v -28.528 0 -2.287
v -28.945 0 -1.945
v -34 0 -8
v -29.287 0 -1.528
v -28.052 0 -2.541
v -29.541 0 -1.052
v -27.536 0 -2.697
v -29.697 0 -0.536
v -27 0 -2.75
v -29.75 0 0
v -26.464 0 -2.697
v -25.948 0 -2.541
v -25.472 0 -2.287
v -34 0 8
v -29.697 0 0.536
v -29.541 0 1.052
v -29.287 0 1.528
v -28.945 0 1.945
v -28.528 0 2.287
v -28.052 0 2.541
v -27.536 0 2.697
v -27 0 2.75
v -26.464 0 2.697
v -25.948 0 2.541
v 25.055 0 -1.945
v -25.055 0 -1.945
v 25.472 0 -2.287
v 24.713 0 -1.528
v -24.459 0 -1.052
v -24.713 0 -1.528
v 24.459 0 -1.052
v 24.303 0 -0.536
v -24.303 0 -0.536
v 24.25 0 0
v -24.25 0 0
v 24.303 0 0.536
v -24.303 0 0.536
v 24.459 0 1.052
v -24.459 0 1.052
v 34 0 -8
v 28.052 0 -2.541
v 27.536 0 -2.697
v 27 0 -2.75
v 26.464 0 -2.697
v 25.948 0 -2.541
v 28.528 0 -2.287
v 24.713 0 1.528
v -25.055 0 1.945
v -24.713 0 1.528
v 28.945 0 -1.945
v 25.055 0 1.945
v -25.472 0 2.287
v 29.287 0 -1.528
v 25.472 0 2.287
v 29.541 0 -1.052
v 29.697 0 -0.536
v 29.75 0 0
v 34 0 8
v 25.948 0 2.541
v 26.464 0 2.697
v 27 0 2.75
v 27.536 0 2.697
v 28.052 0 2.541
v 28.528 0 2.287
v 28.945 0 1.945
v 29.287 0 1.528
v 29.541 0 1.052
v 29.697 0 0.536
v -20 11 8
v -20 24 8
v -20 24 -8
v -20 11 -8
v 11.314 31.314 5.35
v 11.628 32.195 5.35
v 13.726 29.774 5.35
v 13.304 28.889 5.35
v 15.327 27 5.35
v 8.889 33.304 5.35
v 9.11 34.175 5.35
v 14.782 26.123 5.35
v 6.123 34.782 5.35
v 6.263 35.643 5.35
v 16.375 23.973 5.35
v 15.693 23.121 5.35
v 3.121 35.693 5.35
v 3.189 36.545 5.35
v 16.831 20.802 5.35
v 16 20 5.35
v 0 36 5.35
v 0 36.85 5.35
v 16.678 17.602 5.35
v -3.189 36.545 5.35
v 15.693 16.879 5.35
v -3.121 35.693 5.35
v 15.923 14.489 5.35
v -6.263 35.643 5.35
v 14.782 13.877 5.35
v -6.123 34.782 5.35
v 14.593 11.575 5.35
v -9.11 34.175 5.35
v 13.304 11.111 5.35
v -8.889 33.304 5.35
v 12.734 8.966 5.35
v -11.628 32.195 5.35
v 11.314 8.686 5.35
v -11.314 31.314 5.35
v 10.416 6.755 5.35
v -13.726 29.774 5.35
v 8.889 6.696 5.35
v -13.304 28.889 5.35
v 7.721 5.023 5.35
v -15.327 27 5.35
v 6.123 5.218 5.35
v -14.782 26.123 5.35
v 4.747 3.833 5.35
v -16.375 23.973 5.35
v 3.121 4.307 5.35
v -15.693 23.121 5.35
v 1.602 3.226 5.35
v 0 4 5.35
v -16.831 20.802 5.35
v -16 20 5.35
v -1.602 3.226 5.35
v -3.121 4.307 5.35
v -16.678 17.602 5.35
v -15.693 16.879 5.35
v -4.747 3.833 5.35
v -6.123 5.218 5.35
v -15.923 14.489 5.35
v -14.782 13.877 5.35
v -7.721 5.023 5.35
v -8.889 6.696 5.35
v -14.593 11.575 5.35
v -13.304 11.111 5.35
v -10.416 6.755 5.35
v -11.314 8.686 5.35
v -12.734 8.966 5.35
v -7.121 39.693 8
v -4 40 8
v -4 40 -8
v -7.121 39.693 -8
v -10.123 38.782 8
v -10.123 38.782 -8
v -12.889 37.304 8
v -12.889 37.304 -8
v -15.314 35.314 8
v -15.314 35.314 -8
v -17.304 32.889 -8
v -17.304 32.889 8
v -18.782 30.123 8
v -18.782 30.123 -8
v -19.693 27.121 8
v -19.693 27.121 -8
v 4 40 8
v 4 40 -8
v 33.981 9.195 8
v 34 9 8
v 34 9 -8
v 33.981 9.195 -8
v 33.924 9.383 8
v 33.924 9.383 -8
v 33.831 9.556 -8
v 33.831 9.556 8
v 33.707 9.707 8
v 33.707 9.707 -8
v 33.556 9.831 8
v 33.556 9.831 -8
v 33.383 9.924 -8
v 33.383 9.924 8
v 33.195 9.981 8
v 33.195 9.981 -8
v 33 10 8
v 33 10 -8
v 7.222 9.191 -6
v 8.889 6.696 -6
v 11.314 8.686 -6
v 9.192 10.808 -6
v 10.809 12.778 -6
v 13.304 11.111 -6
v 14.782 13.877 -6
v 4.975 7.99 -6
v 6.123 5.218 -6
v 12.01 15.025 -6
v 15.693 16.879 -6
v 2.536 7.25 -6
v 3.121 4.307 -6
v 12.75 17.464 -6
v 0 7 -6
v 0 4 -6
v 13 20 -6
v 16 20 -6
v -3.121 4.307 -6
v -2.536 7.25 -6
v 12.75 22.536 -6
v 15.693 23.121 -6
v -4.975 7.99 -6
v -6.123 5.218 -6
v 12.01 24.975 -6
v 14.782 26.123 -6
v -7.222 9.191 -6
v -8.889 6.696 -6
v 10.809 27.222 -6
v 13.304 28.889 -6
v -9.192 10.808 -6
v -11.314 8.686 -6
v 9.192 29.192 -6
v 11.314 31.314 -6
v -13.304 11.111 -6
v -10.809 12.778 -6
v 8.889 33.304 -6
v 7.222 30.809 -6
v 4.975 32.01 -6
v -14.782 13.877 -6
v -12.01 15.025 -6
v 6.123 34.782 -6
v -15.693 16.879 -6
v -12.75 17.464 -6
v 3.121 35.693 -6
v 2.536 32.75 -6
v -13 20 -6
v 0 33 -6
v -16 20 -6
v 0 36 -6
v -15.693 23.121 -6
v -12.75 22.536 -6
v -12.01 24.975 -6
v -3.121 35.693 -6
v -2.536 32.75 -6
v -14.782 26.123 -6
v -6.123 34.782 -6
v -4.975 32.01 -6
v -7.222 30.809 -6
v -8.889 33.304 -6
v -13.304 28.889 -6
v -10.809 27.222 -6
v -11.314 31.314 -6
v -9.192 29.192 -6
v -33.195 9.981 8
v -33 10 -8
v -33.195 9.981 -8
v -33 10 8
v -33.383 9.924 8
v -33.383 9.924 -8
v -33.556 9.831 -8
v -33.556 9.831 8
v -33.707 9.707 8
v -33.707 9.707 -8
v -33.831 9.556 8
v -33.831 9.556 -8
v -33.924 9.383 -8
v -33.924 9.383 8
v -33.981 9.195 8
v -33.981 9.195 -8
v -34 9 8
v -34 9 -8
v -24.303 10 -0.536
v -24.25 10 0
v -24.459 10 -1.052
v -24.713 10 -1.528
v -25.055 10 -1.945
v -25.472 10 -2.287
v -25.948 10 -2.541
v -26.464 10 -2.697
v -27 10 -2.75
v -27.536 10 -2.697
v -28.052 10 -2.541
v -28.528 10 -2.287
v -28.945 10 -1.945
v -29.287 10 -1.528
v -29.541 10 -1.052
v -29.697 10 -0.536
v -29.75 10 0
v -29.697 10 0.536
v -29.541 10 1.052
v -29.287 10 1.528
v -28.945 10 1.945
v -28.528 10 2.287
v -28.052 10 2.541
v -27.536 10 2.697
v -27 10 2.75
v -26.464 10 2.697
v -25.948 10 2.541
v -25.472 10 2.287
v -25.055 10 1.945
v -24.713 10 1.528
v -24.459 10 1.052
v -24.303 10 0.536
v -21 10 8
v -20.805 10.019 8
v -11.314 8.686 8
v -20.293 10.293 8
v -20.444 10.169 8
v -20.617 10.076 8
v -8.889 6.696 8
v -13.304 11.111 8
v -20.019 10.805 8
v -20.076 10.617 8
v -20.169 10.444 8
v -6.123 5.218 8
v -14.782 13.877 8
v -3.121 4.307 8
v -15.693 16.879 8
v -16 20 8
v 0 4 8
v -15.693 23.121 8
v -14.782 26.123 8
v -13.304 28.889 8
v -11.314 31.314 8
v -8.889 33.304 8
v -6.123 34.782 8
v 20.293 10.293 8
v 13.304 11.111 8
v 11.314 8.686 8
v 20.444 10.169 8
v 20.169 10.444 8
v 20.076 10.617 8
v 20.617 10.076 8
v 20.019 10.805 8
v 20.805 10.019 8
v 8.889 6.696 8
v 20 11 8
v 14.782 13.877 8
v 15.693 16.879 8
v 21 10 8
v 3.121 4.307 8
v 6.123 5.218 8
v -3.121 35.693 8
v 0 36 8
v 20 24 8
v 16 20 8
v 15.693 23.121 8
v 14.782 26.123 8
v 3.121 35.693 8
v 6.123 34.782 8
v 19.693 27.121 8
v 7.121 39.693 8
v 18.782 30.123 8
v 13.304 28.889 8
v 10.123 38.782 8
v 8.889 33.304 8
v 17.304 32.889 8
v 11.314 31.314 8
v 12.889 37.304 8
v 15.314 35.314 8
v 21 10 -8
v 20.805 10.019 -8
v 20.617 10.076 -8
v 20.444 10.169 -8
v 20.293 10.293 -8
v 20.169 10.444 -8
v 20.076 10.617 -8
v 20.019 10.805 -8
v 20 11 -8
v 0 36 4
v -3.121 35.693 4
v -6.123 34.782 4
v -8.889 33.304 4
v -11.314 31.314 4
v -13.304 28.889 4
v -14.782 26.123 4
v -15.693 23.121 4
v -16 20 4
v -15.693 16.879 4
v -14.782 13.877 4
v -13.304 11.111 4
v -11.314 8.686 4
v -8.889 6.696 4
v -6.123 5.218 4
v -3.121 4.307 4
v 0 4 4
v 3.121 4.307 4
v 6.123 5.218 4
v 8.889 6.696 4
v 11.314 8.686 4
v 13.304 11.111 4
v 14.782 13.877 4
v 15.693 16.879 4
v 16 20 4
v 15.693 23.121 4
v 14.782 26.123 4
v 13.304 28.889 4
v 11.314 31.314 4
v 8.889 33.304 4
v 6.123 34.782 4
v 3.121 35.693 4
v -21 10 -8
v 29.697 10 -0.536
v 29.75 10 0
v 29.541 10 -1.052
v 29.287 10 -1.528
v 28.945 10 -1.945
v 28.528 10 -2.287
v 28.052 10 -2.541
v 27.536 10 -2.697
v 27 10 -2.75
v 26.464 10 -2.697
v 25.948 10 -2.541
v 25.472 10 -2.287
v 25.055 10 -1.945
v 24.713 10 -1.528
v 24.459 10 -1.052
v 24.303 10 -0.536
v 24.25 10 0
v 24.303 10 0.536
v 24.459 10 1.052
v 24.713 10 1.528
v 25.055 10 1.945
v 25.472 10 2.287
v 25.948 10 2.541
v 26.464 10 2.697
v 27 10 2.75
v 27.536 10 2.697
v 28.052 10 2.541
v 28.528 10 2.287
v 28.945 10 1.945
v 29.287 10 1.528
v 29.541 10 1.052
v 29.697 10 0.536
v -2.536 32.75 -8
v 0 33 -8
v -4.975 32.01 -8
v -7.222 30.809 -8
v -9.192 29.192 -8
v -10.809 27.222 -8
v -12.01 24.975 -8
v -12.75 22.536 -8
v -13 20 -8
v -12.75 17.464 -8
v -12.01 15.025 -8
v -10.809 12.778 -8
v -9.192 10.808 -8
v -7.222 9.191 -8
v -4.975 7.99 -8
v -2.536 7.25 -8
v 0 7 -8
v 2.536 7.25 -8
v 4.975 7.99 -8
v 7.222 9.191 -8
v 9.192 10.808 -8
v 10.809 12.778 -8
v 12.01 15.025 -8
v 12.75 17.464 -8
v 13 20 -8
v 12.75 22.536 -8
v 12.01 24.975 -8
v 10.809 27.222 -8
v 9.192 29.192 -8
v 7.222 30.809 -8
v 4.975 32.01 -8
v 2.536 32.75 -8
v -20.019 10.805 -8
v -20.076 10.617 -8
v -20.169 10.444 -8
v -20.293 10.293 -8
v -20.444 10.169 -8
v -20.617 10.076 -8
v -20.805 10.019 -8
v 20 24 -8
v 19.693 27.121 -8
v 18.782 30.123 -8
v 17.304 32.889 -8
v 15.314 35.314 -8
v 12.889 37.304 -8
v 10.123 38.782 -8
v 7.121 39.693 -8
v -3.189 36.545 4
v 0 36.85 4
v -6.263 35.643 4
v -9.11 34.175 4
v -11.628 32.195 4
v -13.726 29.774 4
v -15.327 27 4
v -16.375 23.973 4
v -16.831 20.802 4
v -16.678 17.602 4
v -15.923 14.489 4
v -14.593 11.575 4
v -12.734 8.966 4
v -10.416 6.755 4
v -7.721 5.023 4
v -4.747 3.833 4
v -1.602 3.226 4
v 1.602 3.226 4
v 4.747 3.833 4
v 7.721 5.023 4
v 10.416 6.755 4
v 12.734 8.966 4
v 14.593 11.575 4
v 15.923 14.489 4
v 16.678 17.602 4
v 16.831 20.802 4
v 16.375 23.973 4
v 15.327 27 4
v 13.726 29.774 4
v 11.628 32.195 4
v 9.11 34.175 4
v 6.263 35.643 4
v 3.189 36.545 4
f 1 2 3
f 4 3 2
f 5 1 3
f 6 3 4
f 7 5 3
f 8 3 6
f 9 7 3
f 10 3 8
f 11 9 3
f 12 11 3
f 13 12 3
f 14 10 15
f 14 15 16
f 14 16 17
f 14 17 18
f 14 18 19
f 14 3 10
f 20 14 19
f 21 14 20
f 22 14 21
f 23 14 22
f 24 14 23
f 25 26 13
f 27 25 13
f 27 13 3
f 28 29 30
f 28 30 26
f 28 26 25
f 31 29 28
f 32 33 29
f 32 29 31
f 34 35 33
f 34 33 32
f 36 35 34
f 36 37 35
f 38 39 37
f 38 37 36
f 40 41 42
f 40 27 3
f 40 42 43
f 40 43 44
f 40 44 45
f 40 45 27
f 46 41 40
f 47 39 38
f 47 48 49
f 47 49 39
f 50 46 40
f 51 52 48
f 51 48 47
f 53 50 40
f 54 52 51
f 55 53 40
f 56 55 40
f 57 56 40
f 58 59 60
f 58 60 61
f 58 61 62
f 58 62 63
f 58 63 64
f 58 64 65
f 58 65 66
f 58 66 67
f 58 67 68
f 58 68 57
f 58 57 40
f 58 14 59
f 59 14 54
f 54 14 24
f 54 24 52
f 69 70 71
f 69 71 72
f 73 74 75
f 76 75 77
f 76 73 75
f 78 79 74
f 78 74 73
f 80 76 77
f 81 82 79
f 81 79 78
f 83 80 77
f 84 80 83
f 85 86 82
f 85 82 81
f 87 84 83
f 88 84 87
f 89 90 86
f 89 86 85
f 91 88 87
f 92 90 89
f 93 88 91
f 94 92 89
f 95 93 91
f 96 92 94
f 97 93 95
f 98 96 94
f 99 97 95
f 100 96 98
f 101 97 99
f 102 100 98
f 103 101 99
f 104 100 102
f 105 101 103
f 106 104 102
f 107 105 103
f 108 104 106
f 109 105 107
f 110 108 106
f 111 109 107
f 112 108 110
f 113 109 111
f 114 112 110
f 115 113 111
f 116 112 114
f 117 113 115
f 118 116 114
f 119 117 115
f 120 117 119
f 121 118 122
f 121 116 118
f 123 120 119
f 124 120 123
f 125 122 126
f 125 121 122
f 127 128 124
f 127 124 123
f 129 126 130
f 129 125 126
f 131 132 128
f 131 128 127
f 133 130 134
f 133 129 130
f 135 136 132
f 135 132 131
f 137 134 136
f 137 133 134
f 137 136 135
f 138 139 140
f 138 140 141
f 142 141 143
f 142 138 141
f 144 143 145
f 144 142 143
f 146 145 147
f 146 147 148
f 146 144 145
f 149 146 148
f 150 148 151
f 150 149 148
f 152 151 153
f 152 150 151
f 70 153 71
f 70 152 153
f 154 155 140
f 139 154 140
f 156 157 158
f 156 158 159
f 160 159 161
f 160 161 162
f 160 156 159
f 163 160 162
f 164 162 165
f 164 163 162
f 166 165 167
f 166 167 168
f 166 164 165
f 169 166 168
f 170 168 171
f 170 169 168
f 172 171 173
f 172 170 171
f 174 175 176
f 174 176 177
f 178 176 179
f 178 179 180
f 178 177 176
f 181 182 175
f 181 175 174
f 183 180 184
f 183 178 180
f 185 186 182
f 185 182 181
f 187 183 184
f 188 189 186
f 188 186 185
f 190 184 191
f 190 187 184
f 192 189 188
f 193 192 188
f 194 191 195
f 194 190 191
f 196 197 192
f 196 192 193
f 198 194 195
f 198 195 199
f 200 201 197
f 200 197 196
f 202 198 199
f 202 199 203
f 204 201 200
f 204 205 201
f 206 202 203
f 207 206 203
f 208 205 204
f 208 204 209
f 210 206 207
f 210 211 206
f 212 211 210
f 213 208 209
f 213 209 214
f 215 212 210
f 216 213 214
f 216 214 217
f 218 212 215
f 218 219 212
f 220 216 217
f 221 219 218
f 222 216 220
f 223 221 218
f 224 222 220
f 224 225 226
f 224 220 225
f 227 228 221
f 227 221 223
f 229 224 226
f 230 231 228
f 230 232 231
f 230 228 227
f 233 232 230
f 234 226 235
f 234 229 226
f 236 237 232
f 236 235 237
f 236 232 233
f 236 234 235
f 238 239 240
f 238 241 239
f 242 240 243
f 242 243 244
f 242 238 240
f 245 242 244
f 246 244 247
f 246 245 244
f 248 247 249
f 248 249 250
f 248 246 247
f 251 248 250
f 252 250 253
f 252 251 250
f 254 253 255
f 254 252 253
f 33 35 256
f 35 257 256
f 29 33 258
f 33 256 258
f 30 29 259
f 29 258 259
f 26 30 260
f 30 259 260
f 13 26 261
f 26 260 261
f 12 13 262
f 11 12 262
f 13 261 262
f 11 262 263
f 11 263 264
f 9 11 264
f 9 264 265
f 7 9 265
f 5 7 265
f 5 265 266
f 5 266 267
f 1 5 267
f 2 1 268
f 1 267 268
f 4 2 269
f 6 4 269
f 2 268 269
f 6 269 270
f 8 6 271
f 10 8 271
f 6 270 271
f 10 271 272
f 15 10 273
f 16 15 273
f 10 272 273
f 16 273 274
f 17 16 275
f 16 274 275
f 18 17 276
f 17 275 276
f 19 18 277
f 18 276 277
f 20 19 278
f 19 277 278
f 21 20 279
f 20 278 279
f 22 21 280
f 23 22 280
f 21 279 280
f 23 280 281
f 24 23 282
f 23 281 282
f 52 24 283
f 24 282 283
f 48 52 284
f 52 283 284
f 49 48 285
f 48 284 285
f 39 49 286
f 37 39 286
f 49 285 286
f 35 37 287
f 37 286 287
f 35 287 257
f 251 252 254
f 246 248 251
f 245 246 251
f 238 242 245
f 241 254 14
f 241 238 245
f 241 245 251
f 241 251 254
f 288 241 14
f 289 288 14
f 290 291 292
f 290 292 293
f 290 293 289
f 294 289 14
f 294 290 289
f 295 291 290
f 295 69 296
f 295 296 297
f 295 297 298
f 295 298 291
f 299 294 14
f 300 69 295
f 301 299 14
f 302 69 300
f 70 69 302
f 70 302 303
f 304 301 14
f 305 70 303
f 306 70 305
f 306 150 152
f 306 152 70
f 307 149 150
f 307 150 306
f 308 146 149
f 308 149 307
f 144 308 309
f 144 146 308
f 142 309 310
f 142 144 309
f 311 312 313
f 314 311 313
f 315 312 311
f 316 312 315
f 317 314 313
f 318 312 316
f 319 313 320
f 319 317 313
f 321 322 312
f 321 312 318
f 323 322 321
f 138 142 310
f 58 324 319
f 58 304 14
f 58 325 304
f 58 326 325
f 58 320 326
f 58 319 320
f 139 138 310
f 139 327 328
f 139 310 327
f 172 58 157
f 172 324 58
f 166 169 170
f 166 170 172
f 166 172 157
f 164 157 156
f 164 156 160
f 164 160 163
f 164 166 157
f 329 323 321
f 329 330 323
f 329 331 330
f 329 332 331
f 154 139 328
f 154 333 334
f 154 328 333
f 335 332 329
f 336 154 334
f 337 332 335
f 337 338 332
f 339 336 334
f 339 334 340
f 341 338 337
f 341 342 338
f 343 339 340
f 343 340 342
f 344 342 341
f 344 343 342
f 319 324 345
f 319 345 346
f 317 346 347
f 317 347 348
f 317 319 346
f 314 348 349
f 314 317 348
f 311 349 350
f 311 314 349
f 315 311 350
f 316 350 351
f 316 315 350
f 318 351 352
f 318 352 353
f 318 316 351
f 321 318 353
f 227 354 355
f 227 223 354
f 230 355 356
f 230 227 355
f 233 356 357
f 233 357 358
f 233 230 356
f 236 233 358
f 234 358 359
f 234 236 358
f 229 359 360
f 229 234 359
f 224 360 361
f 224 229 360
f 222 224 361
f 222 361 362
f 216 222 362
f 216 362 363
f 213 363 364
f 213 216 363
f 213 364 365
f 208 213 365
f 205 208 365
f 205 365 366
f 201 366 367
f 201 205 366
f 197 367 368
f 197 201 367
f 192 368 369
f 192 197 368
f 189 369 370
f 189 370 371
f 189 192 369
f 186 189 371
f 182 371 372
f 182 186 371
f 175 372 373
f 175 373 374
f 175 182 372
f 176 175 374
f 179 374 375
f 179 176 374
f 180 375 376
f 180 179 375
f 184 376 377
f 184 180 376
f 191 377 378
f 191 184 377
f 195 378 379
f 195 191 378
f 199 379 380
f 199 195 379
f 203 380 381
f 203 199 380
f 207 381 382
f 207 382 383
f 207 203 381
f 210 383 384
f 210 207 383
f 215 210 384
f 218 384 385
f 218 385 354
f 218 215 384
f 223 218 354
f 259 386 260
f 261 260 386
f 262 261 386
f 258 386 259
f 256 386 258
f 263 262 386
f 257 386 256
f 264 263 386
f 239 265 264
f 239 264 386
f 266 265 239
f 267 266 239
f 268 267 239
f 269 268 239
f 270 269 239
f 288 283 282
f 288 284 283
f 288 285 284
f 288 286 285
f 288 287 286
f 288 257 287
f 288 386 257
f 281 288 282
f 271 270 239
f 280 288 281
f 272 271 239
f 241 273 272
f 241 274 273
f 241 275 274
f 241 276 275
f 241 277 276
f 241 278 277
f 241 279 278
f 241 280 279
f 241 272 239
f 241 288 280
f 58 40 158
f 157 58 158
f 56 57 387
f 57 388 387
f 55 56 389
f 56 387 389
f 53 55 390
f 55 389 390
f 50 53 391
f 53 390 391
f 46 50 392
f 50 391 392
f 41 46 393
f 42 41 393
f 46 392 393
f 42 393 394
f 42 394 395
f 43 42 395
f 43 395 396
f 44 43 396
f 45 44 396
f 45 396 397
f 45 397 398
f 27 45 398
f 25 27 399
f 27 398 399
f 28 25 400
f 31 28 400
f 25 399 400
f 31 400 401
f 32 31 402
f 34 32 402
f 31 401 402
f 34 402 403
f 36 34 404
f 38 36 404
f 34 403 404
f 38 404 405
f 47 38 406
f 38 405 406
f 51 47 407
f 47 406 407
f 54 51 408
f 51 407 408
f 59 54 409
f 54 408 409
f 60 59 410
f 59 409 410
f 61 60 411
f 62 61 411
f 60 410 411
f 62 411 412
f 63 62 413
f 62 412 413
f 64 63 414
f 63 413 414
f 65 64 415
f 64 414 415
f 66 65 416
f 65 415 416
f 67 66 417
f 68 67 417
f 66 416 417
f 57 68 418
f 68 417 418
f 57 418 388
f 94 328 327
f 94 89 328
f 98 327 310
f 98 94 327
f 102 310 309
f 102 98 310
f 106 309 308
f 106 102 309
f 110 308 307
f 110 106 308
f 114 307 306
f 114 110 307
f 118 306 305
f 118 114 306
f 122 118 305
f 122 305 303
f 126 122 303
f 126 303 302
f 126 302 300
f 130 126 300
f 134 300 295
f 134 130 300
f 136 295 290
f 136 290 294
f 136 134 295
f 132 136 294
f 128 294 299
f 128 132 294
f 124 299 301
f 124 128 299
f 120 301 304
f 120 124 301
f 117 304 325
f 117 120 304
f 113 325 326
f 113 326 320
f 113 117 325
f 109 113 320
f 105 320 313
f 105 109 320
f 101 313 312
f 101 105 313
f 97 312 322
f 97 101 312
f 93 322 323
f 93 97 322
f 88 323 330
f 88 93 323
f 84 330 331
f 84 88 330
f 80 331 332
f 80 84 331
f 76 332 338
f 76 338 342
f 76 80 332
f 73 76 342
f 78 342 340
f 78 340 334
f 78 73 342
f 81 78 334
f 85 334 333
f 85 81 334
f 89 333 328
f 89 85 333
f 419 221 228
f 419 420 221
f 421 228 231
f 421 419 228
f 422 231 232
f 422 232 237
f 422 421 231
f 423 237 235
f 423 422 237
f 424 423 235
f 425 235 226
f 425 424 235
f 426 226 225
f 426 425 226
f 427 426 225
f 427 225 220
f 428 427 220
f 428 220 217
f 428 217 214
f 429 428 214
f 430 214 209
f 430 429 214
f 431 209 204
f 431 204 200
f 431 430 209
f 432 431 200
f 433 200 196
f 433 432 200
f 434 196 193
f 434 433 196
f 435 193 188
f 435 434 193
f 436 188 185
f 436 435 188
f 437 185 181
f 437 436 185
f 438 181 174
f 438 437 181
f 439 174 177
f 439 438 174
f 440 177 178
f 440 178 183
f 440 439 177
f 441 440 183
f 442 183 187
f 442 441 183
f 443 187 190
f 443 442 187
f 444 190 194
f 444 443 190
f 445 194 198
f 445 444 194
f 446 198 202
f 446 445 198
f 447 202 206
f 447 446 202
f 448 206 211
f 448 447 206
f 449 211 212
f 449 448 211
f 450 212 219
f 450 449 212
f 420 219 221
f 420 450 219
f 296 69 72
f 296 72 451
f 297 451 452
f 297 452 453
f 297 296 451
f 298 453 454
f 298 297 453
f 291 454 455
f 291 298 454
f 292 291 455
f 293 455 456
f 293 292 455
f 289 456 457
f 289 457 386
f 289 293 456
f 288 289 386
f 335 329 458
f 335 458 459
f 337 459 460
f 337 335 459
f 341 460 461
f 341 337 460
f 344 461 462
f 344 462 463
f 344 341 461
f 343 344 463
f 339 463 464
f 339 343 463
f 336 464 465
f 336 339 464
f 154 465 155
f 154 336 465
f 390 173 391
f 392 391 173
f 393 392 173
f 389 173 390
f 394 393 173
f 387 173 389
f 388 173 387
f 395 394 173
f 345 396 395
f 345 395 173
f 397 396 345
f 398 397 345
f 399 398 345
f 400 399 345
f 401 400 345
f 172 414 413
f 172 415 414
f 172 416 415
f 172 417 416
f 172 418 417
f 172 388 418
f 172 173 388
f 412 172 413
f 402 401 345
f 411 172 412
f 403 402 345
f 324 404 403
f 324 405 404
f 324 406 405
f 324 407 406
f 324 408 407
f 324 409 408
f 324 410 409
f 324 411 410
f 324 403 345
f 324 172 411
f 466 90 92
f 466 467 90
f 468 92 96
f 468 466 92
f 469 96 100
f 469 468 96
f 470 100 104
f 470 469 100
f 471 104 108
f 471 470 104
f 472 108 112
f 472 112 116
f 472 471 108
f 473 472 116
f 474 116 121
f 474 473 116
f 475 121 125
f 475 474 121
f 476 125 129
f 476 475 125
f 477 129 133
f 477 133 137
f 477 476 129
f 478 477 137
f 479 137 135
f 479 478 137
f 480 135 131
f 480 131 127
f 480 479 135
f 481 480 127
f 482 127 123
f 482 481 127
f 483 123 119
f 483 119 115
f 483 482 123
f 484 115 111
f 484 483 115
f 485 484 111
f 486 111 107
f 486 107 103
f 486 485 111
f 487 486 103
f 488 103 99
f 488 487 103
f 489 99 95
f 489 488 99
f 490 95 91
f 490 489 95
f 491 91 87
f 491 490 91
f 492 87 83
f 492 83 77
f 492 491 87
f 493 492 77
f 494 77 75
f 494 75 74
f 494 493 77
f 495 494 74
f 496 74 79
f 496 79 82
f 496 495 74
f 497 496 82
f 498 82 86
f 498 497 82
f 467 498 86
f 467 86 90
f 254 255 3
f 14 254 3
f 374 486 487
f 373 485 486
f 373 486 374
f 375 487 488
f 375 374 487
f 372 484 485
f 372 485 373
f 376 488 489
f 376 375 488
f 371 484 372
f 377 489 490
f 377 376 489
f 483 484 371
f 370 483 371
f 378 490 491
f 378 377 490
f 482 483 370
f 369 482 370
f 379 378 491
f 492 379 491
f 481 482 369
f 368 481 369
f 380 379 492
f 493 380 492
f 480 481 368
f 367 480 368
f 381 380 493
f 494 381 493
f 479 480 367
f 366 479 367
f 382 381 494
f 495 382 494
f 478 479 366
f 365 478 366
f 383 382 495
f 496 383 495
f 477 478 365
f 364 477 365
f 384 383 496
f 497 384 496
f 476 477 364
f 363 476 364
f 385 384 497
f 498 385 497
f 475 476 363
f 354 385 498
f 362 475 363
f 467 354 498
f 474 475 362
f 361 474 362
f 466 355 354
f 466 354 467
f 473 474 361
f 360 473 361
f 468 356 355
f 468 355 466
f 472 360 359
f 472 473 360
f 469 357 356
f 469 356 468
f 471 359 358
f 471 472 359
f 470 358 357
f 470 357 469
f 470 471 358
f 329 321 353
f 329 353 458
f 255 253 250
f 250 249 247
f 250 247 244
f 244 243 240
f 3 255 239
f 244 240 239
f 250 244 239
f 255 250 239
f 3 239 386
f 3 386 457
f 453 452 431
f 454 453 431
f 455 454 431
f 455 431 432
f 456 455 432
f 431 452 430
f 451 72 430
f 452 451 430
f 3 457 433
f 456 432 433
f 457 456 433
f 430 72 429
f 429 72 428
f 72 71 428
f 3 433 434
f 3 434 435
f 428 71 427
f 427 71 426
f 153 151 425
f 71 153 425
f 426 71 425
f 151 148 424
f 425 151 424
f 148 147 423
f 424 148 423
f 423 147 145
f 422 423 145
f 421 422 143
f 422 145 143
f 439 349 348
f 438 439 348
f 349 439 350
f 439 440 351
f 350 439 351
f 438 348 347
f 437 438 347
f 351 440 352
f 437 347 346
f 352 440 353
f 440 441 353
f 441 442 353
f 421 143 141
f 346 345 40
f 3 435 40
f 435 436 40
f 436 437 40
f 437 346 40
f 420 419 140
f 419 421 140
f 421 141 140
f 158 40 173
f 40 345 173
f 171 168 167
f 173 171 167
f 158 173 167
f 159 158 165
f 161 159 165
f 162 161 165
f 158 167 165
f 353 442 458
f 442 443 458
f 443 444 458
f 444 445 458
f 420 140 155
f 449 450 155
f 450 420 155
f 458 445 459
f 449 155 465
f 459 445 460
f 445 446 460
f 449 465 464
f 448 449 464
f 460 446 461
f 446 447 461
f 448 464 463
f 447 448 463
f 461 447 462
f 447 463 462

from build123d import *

# Parameters (mm, degrees)
EXTRUDE_1_DEPTH      = 8
EXTRUDE_1_DEPTH_BACK = 8
SKETCH_3_W           = 2.75
SKETCH_3_H           = 10
SKETCH_4_W           = 2.75
SKETCH_4_H           = 10


with BuildPart() as part:
    # ｽｹｯﾁ1 → ﾎﾞｽ - 押し出し1 (new, two sides: drawn at the far end of the back side and taken through both)
    with BuildSketch(Plane.XY.offset(-EXTRUDE_1_DEPTH_BACK)):
        with BuildLine():
            Line((-34, 9), (-34, 0))
            Line((-34, 0), (34, 0))
            Line((34, 0), (34, 9))
            ThreePointArc((34, 9), (33.707106781, 9.707106781), (33, 10))
            Line((33, 10), (21, 10))
            ThreePointArc((21, 10), (20.292893219, 10.292893219), (20, 11))
            Line((20, 11), (20, 24))
            ThreePointArc((20, 24), (15.313708499, 35.313708499), (4, 40))
            Line((4, 40), (-4, 40))
            ThreePointArc((-4, 40), (-15.313708499, 35.313708499), (-20, 24))
            Line((-20, 24), (-20, 11))
            ThreePointArc((-20, 11), (-20.292893219, 10.292893219), (-21, 10))
            Line((-21, 10), (-33, 10))
            ThreePointArc((-33, 10), (-33.707106781, 9.707106781), (-34, 9))
        make_face()
    extrude(amount=EXTRUDE_1_DEPTH + EXTRUDE_1_DEPTH_BACK)

    # ｽｹｯﾁ2 → ｶｯﾄ - 回転1 (revolve, cut)
    with BuildSketch(Plane(origin=(0, 0, 0), x_dir=(0, 0, -1), z_dir=(1, 0, 0))):
        Polygon((-8, 20), (-8, 36), (-5.35, 36), (-5.35, 36.85), (-4, 36.85), (-4, 36), (6, 36), (6, 33), (8, 33), (8, 20), align=None)
    revolve(axis=Axis((0, 20, -8), (0, 0, 1)), mode=Mode.SUBTRACT)

    # ｽｹｯﾁ3 → ｶｯﾄ - 回転2 (revolve, cut)
    with BuildSketch(Plane.XY):
        with Locations((28.375, 5)):
            Rectangle(SKETCH_3_W, SKETCH_3_H)
    revolve(axis=Axis((27, 0, 0), (0, 1, 0)), mode=Mode.SUBTRACT)

    # ｽｹｯﾁ4 → ｶｯﾄ - 回転3 (revolve, cut)
    with BuildSketch(Plane.XY):
        with Locations((-25.625, 5)):
            Rectangle(SKETCH_4_W, SKETCH_4_H)
    revolve(axis=Axis((-27, 0, 0), (0, 1, 0)), mode=Mode.SUBTRACT)


solid = part.part
